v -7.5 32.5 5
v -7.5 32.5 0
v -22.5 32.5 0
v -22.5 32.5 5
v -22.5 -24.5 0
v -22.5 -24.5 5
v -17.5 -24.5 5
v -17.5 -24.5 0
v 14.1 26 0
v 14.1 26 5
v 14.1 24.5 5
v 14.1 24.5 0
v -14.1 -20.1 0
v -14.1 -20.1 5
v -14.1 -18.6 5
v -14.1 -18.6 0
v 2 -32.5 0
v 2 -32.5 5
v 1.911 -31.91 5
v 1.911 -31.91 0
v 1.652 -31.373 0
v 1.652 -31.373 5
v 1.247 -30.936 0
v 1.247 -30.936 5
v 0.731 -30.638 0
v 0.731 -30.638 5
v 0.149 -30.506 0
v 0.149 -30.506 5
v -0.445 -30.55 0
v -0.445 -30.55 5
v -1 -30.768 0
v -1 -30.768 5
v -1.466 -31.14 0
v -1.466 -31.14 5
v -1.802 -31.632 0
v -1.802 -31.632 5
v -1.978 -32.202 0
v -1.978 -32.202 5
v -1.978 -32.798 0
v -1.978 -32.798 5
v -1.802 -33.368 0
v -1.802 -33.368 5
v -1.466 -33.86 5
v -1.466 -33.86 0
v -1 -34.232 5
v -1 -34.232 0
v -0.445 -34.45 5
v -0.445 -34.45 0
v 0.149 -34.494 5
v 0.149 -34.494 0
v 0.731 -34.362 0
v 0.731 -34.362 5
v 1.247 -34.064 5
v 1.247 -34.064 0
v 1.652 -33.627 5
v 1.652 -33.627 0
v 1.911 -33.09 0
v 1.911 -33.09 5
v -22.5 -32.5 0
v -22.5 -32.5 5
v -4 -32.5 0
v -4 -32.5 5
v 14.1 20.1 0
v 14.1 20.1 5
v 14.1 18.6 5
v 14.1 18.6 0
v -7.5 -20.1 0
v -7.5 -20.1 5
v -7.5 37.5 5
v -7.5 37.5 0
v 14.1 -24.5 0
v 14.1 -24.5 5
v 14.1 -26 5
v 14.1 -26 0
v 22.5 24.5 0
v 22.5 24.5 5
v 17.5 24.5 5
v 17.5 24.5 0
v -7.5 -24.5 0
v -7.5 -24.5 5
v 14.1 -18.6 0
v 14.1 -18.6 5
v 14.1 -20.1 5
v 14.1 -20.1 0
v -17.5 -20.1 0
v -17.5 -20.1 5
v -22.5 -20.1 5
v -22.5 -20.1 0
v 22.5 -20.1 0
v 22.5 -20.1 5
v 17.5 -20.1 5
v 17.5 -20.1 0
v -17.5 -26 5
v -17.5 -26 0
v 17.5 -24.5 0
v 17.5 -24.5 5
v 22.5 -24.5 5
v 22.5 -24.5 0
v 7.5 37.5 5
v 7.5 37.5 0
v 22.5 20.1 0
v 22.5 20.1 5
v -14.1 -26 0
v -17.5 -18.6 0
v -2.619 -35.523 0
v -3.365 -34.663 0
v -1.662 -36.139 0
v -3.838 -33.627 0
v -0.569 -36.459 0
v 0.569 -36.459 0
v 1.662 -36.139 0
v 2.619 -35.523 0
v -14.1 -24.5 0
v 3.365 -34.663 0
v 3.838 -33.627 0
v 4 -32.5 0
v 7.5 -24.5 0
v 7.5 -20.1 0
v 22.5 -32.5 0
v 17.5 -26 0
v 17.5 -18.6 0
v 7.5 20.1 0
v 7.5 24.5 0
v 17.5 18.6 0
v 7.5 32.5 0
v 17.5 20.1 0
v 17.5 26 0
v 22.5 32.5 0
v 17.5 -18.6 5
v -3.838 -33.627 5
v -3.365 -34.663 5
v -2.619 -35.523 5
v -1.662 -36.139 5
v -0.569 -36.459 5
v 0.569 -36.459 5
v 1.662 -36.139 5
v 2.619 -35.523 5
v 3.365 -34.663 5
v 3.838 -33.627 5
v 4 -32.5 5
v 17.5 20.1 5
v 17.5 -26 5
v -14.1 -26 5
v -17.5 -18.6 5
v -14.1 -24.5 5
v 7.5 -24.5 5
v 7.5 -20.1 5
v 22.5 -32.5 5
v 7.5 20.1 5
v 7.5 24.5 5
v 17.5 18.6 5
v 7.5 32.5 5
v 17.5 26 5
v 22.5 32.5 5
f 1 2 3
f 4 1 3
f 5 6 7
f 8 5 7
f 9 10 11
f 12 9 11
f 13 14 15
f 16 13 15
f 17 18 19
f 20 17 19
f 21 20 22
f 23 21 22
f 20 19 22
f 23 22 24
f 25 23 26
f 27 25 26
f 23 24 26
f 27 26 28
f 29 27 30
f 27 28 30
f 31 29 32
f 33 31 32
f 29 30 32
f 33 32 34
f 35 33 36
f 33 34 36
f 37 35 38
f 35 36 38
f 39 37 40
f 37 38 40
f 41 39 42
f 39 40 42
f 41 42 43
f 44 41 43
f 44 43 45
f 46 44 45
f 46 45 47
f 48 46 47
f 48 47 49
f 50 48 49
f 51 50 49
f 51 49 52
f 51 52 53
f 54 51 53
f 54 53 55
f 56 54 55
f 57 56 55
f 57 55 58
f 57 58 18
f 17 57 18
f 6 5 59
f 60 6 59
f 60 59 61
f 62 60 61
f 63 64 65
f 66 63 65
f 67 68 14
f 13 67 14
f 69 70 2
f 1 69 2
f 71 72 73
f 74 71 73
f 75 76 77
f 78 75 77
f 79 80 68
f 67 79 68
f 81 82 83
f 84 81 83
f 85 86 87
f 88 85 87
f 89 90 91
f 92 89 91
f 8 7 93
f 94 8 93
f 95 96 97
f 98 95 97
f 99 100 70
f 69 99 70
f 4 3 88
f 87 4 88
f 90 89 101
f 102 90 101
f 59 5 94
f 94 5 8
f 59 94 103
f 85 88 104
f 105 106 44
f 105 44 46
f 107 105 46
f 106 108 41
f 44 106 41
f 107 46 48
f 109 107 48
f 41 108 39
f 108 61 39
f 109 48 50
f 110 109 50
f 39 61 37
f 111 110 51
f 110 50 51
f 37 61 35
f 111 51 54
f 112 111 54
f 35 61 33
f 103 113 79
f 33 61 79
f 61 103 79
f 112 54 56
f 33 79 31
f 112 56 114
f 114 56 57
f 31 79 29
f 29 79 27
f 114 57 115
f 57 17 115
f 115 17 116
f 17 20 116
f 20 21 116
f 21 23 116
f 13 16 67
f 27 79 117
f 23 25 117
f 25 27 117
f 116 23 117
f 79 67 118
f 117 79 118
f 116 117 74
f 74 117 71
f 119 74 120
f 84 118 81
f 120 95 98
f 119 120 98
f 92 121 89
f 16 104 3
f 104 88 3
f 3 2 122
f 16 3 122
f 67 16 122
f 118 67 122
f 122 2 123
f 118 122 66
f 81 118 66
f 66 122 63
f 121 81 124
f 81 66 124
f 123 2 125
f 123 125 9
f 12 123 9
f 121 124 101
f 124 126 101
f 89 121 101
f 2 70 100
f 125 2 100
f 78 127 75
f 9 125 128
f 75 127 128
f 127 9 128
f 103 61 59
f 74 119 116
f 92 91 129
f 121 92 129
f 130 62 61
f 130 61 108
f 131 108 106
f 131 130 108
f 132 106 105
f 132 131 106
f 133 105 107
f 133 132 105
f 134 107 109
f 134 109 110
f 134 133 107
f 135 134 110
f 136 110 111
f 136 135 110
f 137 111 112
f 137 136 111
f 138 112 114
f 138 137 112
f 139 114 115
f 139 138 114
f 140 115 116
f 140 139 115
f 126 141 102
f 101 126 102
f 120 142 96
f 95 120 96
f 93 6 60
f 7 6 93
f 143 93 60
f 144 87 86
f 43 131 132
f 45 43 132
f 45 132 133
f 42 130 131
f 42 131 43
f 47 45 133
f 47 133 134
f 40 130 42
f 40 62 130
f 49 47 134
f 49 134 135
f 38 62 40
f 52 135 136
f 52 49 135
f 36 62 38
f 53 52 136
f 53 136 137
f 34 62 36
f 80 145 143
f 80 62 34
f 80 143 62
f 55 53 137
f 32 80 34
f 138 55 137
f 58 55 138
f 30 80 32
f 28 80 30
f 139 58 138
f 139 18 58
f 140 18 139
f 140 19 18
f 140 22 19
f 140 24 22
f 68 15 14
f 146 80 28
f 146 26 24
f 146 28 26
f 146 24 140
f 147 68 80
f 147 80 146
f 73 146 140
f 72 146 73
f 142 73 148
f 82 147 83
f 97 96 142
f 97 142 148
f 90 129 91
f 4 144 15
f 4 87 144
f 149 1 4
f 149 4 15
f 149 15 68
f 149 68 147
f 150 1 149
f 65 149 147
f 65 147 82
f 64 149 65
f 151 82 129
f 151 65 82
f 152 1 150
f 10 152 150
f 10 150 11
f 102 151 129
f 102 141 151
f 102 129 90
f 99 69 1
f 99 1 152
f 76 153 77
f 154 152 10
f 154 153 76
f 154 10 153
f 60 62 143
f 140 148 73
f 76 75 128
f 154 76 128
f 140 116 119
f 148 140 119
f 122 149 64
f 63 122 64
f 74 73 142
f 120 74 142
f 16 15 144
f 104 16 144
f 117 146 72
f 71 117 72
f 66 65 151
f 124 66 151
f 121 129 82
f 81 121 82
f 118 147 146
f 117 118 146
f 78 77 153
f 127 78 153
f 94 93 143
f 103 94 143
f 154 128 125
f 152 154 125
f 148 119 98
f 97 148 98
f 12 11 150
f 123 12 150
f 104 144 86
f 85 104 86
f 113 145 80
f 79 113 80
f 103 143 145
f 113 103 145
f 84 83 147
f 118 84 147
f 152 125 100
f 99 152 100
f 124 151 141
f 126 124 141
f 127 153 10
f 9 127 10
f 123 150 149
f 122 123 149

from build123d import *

# Parameters (mm, degrees)
BOSS_EXTRUDE1_DEPTH = 5
CUT_EXTRUDE1_DEPTH  = 5
SKETCH5_R           = 4
SKETCH5_R_2         = 2
BOSS_EXTRUDE2_DEPTH = 5
SKETCH6_R           = 2
CUT_EXTRUDE2_DEPTH  = 5


with BuildPart() as part:
    # Sketch1 → Boss-Extrude1 (new body)
    with BuildSketch(Plane.XY):
        Polygon((7.5, 32.5), (7.5, 37.5), (-7.5, 37.5), (-7.5, 32.5), (-22.5, 32.5), (-22.5, -32.5), (22.5, -32.5), (22.5, 32.5), align=None)
    extrude(amount=BOSS_EXTRUDE1_DEPTH)

    # Sketch3 → Cut-Extrude1 (cut)
    with BuildSketch(Plane.XY.offset(5)):
        Polygon((22.5, 24.5), (17.5, 24.5), (17.5, 26), (14.1, 26), (14.1, 24.5), (7.5, 24.5), (7.5, 20.1), (14.1, 20.1), (14.1, 18.6), (17.5, 18.6), (17.5, 20.1), (22.5, 20.1), align=None)
        Polygon((22.5, -24.5), (22.5, -20.1), (17.5, -20.1), (17.5, -18.6), (14.1, -18.6), (14.1, -20.1), (7.5, -20.1), (7.5, -24.5), (14.1, -24.5), (14.1, -26), (17.5, -26), (17.5, -24.5), align=None)
        Polygon((-22.5, -24.5), (-17.5, -24.5), (-17.5, -26), (-14.1, -26), (-14.1, -24.5), (-7.5, -24.5), (-7.5, -20.1), (-14.1, -20.1), (-14.1, -18.6), (-17.5, -18.6), (-17.5, -20.1), (-22.5, -20.1), align=None)
    extrude(amount=-CUT_EXTRUDE1_DEPTH, mode=Mode.SUBTRACT)

    # Sketch5 → Boss-Extrude2 (add)
    with BuildSketch(Plane.XY.offset(5)):
        with Locations((0, -32.5)):
            Circle(SKETCH5_R)
        with Locations((0, -32.5)):
            Circle(SKETCH5_R_2, mode=Mode.SUBTRACT)
    extrude(amount=-BOSS_EXTRUDE2_DEPTH)

    # Sketch6 → Cut-Extrude2 (cut)
    with BuildSketch(Plane.XY.offset(5)):
        with Locations((0, -32.5)):
            Circle(SKETCH6_R)
    extrude(amount=-CUT_EXTRUDE2_DEPTH, mode=Mode.SUBTRACT)


solid = part.part
